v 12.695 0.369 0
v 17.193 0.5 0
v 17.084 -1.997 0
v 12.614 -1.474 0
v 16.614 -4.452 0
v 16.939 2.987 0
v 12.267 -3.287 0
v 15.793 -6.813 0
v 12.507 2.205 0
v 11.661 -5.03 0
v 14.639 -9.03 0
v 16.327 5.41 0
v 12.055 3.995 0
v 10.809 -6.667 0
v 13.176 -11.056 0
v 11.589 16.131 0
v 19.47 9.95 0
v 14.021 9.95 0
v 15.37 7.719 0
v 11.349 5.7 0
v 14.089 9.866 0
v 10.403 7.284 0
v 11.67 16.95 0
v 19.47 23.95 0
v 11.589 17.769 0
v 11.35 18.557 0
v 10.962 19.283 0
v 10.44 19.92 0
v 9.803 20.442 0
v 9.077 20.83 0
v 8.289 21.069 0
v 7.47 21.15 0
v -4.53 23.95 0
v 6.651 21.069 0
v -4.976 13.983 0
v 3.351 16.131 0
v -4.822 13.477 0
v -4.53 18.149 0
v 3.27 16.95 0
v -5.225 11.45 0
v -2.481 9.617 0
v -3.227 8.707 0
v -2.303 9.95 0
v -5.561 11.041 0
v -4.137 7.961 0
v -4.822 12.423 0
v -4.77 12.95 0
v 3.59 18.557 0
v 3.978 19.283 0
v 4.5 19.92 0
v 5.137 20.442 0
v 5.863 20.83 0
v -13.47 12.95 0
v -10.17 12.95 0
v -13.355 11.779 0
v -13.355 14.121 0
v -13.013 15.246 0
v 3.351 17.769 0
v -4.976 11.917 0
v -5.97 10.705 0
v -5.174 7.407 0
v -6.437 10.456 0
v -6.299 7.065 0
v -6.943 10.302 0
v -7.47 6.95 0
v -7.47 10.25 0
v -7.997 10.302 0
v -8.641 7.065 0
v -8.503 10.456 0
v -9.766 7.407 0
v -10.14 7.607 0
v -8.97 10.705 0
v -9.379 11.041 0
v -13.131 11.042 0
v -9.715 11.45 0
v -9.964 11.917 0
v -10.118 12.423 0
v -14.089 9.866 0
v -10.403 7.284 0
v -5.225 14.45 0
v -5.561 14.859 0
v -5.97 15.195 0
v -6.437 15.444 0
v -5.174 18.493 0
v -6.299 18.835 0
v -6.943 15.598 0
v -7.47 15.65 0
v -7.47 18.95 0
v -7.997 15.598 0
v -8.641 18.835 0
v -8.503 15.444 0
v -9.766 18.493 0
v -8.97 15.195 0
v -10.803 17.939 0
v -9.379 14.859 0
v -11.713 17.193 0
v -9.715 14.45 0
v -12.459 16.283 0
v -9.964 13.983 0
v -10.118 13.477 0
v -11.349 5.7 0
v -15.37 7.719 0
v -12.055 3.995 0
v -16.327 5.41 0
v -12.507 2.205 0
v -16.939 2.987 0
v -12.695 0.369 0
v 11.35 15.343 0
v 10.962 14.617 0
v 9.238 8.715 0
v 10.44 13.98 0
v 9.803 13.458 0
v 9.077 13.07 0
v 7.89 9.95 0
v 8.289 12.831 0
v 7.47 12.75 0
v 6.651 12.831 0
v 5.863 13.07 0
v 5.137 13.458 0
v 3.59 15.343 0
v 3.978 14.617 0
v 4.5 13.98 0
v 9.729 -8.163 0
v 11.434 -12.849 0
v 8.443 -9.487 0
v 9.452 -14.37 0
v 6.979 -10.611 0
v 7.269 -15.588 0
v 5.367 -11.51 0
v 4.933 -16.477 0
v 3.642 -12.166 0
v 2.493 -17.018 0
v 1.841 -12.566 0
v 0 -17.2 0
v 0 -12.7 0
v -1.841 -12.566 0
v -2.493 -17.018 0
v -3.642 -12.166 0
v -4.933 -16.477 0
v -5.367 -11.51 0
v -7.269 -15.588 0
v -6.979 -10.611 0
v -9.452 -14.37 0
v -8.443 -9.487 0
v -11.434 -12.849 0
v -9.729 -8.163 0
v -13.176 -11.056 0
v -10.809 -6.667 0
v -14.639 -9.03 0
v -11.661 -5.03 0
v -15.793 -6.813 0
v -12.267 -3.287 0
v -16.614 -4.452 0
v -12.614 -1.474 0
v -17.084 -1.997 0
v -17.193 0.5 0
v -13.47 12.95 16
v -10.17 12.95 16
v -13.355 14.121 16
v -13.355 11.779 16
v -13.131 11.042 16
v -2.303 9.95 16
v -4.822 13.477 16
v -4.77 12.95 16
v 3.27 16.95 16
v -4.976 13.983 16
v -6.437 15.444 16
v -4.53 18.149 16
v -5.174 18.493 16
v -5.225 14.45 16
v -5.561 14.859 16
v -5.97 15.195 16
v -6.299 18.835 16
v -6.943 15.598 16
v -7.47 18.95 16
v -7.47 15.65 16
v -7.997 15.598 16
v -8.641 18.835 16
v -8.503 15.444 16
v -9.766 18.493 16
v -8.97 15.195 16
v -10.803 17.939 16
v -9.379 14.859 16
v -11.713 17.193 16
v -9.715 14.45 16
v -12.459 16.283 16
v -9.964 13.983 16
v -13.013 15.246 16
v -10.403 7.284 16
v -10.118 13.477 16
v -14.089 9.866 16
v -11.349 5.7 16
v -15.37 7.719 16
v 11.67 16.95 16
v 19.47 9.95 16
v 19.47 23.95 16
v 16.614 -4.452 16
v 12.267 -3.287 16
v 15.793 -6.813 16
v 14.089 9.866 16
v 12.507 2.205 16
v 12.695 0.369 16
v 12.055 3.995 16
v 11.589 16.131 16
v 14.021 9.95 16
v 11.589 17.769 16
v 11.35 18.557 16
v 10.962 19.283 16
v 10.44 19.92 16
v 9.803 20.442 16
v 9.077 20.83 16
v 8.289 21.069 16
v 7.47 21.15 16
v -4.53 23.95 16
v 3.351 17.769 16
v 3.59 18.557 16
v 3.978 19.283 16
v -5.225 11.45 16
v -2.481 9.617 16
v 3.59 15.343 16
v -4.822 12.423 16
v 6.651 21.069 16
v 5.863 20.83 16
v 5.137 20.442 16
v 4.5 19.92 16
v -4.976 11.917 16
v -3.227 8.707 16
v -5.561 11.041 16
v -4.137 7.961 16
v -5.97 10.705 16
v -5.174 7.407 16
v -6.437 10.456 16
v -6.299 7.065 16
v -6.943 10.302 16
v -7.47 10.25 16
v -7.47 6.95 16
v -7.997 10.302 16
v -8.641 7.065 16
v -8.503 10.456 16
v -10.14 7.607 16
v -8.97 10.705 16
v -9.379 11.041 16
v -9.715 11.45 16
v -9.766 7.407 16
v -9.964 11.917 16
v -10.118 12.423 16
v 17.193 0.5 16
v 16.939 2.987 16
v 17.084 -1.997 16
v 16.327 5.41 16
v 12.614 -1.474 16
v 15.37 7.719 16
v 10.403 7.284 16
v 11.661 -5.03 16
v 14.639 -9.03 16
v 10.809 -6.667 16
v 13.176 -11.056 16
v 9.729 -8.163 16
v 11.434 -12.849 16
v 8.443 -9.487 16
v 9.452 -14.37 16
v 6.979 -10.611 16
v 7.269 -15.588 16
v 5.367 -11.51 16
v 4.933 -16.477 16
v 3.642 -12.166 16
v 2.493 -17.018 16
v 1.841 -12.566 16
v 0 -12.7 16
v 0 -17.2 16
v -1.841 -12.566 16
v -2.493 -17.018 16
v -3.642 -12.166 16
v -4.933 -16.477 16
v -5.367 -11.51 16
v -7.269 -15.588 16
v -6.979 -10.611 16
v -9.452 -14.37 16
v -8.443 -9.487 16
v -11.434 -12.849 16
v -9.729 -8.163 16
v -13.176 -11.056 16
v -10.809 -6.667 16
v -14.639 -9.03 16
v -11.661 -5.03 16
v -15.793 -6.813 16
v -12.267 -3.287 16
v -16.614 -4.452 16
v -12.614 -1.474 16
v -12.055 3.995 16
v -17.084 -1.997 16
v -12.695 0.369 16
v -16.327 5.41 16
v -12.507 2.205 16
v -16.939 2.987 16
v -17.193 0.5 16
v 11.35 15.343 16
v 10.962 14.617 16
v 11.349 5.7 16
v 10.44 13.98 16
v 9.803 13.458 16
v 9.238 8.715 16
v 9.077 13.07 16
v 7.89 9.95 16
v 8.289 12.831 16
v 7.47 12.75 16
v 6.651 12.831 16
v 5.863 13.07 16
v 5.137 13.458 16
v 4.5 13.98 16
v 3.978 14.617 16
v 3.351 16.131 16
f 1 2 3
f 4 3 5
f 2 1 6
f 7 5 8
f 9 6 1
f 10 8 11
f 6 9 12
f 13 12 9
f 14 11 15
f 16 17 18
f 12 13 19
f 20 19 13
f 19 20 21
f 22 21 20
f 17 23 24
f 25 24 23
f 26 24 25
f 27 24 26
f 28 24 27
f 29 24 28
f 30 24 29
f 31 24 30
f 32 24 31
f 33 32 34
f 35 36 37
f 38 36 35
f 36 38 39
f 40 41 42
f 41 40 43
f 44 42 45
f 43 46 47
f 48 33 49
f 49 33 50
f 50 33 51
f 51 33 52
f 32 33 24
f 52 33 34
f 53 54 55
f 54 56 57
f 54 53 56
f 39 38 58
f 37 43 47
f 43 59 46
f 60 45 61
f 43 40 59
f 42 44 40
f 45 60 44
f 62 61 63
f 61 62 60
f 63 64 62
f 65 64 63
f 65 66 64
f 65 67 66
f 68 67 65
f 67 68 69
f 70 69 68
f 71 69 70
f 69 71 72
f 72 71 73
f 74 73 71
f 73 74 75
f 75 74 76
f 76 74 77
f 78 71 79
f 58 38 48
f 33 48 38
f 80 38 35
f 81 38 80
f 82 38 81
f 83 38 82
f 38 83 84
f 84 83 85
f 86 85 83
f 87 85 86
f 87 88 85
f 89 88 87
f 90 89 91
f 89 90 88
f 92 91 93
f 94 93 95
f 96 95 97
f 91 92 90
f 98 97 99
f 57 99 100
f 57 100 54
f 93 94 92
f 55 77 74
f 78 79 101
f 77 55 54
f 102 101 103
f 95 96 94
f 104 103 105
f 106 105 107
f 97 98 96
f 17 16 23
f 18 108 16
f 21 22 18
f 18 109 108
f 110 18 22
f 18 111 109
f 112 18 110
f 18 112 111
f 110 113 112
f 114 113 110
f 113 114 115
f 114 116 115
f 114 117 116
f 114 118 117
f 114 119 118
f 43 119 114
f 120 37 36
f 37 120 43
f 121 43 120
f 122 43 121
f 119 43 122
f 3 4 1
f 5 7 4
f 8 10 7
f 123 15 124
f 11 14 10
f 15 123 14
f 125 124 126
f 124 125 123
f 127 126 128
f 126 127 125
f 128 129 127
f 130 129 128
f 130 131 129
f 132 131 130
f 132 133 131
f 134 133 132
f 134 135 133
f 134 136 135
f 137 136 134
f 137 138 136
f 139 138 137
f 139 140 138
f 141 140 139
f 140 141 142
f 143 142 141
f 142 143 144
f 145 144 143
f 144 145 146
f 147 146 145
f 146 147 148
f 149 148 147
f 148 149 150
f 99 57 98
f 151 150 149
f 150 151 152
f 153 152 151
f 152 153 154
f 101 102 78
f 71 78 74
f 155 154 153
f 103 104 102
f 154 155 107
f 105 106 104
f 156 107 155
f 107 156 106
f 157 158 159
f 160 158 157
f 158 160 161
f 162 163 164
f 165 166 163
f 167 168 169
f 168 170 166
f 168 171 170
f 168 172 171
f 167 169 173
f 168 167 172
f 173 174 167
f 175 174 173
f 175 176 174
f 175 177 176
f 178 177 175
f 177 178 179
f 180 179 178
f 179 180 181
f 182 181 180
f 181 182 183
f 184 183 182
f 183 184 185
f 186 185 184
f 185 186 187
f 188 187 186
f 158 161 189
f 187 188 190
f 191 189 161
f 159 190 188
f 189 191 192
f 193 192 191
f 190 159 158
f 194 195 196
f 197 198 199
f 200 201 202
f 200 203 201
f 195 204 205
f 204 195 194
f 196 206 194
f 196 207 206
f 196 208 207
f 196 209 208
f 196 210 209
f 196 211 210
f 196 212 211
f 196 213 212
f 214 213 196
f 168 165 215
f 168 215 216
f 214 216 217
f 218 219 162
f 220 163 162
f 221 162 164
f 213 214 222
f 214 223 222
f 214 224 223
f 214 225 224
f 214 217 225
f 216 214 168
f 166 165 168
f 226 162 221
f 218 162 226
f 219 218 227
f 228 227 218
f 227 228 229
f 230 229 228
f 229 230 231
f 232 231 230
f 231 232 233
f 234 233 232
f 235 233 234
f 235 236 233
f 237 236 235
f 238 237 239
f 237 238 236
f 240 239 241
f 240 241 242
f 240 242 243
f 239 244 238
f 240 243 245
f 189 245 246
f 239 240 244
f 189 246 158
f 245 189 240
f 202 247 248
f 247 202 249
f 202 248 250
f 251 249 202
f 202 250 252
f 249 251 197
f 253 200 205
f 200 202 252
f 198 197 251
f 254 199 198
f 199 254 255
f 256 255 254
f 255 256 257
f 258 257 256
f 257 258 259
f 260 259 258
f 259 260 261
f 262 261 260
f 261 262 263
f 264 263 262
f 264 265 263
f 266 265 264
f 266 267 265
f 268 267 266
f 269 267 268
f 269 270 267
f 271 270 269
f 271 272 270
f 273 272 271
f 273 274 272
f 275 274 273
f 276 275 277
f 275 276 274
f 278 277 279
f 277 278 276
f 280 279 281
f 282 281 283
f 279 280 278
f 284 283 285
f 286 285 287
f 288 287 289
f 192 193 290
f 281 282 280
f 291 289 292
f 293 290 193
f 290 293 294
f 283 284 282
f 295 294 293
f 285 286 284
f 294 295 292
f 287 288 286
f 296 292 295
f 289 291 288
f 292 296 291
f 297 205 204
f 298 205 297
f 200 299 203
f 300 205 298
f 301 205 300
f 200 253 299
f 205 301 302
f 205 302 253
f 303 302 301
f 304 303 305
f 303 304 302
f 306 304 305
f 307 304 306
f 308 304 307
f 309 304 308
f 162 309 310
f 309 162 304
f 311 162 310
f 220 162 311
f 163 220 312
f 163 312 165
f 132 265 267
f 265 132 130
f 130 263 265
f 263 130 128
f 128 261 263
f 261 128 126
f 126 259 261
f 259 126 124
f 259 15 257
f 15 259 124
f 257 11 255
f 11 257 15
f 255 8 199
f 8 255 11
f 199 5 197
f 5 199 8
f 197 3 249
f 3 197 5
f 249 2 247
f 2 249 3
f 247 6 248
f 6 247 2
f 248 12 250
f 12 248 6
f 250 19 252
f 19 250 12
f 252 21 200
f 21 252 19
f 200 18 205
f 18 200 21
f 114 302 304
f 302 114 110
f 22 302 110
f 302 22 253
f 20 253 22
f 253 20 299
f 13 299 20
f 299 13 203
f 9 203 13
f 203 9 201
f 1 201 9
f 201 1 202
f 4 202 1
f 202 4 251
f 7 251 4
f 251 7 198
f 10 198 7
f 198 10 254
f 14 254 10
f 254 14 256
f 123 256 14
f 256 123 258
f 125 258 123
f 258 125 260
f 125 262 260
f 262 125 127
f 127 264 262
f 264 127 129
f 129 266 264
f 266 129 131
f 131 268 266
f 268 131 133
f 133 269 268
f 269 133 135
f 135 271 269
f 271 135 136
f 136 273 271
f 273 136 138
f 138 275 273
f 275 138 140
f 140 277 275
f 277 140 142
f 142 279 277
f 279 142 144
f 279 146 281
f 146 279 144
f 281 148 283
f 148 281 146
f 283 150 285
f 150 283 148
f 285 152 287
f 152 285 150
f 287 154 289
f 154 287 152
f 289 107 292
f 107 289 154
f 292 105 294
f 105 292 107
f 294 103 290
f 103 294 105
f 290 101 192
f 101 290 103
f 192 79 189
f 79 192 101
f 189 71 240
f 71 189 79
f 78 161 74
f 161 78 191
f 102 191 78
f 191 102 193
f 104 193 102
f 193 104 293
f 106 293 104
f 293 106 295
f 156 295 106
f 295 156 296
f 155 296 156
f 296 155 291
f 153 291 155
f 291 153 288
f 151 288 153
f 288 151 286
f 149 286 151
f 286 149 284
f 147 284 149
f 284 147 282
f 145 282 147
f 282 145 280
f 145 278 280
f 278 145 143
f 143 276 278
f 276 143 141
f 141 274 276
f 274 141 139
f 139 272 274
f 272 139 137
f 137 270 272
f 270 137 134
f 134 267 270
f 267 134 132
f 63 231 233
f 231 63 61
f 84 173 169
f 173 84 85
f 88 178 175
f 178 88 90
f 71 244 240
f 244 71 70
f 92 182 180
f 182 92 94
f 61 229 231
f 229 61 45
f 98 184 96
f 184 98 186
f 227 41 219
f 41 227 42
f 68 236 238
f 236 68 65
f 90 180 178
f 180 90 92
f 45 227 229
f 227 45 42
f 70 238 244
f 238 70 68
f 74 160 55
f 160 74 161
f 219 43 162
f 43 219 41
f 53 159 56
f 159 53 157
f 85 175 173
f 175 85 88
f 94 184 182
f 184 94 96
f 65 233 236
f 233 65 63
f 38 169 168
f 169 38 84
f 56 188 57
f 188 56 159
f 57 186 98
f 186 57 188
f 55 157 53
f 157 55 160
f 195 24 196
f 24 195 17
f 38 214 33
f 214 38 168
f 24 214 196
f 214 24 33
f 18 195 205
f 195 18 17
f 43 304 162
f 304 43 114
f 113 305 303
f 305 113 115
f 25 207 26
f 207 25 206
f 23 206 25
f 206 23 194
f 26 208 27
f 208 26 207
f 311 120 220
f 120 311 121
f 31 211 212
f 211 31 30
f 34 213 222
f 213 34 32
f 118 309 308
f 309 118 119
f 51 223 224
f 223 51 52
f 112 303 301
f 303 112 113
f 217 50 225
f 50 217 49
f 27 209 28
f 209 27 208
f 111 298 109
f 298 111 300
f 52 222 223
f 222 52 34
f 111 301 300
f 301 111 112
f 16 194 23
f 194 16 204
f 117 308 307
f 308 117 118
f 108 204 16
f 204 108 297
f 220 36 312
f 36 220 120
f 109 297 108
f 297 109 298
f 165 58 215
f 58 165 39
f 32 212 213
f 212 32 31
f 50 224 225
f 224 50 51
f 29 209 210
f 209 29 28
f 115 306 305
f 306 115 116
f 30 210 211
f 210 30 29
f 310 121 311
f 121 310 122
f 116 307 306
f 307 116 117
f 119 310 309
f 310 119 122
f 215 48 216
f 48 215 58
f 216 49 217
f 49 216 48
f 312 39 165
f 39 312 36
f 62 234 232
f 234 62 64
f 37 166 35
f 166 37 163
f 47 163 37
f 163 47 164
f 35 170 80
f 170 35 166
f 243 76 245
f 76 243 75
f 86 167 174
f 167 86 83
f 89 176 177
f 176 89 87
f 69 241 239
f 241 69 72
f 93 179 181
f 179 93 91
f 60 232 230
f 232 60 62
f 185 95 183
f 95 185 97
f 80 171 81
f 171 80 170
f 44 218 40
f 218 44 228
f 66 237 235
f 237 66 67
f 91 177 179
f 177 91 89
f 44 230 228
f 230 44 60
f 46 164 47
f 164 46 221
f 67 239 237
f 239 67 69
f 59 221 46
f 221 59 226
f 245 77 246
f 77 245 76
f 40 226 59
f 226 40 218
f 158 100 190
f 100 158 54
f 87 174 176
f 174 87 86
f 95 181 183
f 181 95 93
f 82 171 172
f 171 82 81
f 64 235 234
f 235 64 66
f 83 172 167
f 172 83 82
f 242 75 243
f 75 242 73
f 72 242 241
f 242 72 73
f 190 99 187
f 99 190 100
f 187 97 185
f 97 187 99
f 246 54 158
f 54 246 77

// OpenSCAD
$fn = 32;

// ----------------------------------------------------------------------
// Pipe clamp: 34.4 mm ring, 4.5 mm wall, 16 mm wide
// ----------------------------------------------------------------------

// --- parameters (mm) ---
outer_r = 17.2;           // clamp outside radius
inner_r = 12.7;           // pipe bore radius
band = 4.5;               // band thickness
clamp_w = 16;             // clamp width
opening = 60;             // opening angle between the ends
lug_w = 24;               // lug width
lug_len = 14;             // lug length
bolt_d = 8.4;             // bolt hole
knuckle_d = 12;           // hinge knuckle diameter
pin_d = 5.4;              // hinge pin hole

clamp_profile = [[-8.6, 14.896], [-10.668, 13.492], [-12.511, 11.803], [-14.089, 9.866], [-15.37, 7.719], [-16.327, 5.41], [-16.939, 2.987], [-17.193, 0.5], [-17.084, -1.997], [-16.614, -4.452], [-15.793, -6.813], [-14.639, -9.03], [-13.176, -11.056], [-11.434, -12.849], [-9.452, -14.37], [-7.269, -15.588], [-4.933, -16.477], [-2.493, -17.018], [0, -17.2], [2.493, -17.018], [4.933, -16.477], [7.269, -15.588], [9.452, -14.37], [11.434, -12.849], [13.176, -11.056], [14.639, -9.03], [15.793, -6.813], [16.614, -4.452], [17.084, -1.997], [17.193, 0.5], [16.939, 2.987], [16.327, 5.41], [15.37, 7.719], [14.089, 9.866], [12.511, 11.803], [10.668, 13.492], [8.6, 14.896], [6.35, 10.999], [7.877, 9.962], [9.238, 8.715], [10.403, 7.284], [11.349, 5.7], [12.055, 3.995], [12.507, 2.205], [12.695, 0.369], [12.614, -1.474], [12.267, -3.287], [11.661, -5.03], [10.809, -6.667], [9.729, -8.163], [8.443, -9.487], [6.979, -10.611], [5.367, -11.51], [3.642, -12.166], [1.841, -12.566], [0, -12.7], [-1.841, -12.566], [-3.642, -12.166], [-5.367, -11.51], [-6.979, -10.611], [-8.443, -9.487], [-9.729, -8.163], [-10.809, -6.667], [-11.661, -5.03], [-12.267, -3.287], [-12.614, -1.474], [-12.695, 0.369], [-12.507, 2.205], [-12.055, 3.995], [-11.349, 5.7], [-10.403, 7.284], [-9.238, 8.715], [-7.877, 9.962], [-6.35, 10.999]];

difference() {
  union() {
    linear_extrude(height = clamp_w) polygon(clamp_profile);
    /* hinge knuckle, sunk 2 mm into the band end */
    translate([-7.47, 12.95, 0]) cylinder(h = clamp_w, d = knuckle_d);
    /* bolt lug on the other end */
    translate([-4.53, 9.95, 0]) cube([lug_w, 14, clamp_w]);
  }
  translate([7.47, 16.95, -2.5]) cylinder(h = clamp_w + 5, d = bolt_d);
  translate([-7.47, 12.95, -2.5]) cylinder(h = clamp_w + 5, d = pin_d);
}
